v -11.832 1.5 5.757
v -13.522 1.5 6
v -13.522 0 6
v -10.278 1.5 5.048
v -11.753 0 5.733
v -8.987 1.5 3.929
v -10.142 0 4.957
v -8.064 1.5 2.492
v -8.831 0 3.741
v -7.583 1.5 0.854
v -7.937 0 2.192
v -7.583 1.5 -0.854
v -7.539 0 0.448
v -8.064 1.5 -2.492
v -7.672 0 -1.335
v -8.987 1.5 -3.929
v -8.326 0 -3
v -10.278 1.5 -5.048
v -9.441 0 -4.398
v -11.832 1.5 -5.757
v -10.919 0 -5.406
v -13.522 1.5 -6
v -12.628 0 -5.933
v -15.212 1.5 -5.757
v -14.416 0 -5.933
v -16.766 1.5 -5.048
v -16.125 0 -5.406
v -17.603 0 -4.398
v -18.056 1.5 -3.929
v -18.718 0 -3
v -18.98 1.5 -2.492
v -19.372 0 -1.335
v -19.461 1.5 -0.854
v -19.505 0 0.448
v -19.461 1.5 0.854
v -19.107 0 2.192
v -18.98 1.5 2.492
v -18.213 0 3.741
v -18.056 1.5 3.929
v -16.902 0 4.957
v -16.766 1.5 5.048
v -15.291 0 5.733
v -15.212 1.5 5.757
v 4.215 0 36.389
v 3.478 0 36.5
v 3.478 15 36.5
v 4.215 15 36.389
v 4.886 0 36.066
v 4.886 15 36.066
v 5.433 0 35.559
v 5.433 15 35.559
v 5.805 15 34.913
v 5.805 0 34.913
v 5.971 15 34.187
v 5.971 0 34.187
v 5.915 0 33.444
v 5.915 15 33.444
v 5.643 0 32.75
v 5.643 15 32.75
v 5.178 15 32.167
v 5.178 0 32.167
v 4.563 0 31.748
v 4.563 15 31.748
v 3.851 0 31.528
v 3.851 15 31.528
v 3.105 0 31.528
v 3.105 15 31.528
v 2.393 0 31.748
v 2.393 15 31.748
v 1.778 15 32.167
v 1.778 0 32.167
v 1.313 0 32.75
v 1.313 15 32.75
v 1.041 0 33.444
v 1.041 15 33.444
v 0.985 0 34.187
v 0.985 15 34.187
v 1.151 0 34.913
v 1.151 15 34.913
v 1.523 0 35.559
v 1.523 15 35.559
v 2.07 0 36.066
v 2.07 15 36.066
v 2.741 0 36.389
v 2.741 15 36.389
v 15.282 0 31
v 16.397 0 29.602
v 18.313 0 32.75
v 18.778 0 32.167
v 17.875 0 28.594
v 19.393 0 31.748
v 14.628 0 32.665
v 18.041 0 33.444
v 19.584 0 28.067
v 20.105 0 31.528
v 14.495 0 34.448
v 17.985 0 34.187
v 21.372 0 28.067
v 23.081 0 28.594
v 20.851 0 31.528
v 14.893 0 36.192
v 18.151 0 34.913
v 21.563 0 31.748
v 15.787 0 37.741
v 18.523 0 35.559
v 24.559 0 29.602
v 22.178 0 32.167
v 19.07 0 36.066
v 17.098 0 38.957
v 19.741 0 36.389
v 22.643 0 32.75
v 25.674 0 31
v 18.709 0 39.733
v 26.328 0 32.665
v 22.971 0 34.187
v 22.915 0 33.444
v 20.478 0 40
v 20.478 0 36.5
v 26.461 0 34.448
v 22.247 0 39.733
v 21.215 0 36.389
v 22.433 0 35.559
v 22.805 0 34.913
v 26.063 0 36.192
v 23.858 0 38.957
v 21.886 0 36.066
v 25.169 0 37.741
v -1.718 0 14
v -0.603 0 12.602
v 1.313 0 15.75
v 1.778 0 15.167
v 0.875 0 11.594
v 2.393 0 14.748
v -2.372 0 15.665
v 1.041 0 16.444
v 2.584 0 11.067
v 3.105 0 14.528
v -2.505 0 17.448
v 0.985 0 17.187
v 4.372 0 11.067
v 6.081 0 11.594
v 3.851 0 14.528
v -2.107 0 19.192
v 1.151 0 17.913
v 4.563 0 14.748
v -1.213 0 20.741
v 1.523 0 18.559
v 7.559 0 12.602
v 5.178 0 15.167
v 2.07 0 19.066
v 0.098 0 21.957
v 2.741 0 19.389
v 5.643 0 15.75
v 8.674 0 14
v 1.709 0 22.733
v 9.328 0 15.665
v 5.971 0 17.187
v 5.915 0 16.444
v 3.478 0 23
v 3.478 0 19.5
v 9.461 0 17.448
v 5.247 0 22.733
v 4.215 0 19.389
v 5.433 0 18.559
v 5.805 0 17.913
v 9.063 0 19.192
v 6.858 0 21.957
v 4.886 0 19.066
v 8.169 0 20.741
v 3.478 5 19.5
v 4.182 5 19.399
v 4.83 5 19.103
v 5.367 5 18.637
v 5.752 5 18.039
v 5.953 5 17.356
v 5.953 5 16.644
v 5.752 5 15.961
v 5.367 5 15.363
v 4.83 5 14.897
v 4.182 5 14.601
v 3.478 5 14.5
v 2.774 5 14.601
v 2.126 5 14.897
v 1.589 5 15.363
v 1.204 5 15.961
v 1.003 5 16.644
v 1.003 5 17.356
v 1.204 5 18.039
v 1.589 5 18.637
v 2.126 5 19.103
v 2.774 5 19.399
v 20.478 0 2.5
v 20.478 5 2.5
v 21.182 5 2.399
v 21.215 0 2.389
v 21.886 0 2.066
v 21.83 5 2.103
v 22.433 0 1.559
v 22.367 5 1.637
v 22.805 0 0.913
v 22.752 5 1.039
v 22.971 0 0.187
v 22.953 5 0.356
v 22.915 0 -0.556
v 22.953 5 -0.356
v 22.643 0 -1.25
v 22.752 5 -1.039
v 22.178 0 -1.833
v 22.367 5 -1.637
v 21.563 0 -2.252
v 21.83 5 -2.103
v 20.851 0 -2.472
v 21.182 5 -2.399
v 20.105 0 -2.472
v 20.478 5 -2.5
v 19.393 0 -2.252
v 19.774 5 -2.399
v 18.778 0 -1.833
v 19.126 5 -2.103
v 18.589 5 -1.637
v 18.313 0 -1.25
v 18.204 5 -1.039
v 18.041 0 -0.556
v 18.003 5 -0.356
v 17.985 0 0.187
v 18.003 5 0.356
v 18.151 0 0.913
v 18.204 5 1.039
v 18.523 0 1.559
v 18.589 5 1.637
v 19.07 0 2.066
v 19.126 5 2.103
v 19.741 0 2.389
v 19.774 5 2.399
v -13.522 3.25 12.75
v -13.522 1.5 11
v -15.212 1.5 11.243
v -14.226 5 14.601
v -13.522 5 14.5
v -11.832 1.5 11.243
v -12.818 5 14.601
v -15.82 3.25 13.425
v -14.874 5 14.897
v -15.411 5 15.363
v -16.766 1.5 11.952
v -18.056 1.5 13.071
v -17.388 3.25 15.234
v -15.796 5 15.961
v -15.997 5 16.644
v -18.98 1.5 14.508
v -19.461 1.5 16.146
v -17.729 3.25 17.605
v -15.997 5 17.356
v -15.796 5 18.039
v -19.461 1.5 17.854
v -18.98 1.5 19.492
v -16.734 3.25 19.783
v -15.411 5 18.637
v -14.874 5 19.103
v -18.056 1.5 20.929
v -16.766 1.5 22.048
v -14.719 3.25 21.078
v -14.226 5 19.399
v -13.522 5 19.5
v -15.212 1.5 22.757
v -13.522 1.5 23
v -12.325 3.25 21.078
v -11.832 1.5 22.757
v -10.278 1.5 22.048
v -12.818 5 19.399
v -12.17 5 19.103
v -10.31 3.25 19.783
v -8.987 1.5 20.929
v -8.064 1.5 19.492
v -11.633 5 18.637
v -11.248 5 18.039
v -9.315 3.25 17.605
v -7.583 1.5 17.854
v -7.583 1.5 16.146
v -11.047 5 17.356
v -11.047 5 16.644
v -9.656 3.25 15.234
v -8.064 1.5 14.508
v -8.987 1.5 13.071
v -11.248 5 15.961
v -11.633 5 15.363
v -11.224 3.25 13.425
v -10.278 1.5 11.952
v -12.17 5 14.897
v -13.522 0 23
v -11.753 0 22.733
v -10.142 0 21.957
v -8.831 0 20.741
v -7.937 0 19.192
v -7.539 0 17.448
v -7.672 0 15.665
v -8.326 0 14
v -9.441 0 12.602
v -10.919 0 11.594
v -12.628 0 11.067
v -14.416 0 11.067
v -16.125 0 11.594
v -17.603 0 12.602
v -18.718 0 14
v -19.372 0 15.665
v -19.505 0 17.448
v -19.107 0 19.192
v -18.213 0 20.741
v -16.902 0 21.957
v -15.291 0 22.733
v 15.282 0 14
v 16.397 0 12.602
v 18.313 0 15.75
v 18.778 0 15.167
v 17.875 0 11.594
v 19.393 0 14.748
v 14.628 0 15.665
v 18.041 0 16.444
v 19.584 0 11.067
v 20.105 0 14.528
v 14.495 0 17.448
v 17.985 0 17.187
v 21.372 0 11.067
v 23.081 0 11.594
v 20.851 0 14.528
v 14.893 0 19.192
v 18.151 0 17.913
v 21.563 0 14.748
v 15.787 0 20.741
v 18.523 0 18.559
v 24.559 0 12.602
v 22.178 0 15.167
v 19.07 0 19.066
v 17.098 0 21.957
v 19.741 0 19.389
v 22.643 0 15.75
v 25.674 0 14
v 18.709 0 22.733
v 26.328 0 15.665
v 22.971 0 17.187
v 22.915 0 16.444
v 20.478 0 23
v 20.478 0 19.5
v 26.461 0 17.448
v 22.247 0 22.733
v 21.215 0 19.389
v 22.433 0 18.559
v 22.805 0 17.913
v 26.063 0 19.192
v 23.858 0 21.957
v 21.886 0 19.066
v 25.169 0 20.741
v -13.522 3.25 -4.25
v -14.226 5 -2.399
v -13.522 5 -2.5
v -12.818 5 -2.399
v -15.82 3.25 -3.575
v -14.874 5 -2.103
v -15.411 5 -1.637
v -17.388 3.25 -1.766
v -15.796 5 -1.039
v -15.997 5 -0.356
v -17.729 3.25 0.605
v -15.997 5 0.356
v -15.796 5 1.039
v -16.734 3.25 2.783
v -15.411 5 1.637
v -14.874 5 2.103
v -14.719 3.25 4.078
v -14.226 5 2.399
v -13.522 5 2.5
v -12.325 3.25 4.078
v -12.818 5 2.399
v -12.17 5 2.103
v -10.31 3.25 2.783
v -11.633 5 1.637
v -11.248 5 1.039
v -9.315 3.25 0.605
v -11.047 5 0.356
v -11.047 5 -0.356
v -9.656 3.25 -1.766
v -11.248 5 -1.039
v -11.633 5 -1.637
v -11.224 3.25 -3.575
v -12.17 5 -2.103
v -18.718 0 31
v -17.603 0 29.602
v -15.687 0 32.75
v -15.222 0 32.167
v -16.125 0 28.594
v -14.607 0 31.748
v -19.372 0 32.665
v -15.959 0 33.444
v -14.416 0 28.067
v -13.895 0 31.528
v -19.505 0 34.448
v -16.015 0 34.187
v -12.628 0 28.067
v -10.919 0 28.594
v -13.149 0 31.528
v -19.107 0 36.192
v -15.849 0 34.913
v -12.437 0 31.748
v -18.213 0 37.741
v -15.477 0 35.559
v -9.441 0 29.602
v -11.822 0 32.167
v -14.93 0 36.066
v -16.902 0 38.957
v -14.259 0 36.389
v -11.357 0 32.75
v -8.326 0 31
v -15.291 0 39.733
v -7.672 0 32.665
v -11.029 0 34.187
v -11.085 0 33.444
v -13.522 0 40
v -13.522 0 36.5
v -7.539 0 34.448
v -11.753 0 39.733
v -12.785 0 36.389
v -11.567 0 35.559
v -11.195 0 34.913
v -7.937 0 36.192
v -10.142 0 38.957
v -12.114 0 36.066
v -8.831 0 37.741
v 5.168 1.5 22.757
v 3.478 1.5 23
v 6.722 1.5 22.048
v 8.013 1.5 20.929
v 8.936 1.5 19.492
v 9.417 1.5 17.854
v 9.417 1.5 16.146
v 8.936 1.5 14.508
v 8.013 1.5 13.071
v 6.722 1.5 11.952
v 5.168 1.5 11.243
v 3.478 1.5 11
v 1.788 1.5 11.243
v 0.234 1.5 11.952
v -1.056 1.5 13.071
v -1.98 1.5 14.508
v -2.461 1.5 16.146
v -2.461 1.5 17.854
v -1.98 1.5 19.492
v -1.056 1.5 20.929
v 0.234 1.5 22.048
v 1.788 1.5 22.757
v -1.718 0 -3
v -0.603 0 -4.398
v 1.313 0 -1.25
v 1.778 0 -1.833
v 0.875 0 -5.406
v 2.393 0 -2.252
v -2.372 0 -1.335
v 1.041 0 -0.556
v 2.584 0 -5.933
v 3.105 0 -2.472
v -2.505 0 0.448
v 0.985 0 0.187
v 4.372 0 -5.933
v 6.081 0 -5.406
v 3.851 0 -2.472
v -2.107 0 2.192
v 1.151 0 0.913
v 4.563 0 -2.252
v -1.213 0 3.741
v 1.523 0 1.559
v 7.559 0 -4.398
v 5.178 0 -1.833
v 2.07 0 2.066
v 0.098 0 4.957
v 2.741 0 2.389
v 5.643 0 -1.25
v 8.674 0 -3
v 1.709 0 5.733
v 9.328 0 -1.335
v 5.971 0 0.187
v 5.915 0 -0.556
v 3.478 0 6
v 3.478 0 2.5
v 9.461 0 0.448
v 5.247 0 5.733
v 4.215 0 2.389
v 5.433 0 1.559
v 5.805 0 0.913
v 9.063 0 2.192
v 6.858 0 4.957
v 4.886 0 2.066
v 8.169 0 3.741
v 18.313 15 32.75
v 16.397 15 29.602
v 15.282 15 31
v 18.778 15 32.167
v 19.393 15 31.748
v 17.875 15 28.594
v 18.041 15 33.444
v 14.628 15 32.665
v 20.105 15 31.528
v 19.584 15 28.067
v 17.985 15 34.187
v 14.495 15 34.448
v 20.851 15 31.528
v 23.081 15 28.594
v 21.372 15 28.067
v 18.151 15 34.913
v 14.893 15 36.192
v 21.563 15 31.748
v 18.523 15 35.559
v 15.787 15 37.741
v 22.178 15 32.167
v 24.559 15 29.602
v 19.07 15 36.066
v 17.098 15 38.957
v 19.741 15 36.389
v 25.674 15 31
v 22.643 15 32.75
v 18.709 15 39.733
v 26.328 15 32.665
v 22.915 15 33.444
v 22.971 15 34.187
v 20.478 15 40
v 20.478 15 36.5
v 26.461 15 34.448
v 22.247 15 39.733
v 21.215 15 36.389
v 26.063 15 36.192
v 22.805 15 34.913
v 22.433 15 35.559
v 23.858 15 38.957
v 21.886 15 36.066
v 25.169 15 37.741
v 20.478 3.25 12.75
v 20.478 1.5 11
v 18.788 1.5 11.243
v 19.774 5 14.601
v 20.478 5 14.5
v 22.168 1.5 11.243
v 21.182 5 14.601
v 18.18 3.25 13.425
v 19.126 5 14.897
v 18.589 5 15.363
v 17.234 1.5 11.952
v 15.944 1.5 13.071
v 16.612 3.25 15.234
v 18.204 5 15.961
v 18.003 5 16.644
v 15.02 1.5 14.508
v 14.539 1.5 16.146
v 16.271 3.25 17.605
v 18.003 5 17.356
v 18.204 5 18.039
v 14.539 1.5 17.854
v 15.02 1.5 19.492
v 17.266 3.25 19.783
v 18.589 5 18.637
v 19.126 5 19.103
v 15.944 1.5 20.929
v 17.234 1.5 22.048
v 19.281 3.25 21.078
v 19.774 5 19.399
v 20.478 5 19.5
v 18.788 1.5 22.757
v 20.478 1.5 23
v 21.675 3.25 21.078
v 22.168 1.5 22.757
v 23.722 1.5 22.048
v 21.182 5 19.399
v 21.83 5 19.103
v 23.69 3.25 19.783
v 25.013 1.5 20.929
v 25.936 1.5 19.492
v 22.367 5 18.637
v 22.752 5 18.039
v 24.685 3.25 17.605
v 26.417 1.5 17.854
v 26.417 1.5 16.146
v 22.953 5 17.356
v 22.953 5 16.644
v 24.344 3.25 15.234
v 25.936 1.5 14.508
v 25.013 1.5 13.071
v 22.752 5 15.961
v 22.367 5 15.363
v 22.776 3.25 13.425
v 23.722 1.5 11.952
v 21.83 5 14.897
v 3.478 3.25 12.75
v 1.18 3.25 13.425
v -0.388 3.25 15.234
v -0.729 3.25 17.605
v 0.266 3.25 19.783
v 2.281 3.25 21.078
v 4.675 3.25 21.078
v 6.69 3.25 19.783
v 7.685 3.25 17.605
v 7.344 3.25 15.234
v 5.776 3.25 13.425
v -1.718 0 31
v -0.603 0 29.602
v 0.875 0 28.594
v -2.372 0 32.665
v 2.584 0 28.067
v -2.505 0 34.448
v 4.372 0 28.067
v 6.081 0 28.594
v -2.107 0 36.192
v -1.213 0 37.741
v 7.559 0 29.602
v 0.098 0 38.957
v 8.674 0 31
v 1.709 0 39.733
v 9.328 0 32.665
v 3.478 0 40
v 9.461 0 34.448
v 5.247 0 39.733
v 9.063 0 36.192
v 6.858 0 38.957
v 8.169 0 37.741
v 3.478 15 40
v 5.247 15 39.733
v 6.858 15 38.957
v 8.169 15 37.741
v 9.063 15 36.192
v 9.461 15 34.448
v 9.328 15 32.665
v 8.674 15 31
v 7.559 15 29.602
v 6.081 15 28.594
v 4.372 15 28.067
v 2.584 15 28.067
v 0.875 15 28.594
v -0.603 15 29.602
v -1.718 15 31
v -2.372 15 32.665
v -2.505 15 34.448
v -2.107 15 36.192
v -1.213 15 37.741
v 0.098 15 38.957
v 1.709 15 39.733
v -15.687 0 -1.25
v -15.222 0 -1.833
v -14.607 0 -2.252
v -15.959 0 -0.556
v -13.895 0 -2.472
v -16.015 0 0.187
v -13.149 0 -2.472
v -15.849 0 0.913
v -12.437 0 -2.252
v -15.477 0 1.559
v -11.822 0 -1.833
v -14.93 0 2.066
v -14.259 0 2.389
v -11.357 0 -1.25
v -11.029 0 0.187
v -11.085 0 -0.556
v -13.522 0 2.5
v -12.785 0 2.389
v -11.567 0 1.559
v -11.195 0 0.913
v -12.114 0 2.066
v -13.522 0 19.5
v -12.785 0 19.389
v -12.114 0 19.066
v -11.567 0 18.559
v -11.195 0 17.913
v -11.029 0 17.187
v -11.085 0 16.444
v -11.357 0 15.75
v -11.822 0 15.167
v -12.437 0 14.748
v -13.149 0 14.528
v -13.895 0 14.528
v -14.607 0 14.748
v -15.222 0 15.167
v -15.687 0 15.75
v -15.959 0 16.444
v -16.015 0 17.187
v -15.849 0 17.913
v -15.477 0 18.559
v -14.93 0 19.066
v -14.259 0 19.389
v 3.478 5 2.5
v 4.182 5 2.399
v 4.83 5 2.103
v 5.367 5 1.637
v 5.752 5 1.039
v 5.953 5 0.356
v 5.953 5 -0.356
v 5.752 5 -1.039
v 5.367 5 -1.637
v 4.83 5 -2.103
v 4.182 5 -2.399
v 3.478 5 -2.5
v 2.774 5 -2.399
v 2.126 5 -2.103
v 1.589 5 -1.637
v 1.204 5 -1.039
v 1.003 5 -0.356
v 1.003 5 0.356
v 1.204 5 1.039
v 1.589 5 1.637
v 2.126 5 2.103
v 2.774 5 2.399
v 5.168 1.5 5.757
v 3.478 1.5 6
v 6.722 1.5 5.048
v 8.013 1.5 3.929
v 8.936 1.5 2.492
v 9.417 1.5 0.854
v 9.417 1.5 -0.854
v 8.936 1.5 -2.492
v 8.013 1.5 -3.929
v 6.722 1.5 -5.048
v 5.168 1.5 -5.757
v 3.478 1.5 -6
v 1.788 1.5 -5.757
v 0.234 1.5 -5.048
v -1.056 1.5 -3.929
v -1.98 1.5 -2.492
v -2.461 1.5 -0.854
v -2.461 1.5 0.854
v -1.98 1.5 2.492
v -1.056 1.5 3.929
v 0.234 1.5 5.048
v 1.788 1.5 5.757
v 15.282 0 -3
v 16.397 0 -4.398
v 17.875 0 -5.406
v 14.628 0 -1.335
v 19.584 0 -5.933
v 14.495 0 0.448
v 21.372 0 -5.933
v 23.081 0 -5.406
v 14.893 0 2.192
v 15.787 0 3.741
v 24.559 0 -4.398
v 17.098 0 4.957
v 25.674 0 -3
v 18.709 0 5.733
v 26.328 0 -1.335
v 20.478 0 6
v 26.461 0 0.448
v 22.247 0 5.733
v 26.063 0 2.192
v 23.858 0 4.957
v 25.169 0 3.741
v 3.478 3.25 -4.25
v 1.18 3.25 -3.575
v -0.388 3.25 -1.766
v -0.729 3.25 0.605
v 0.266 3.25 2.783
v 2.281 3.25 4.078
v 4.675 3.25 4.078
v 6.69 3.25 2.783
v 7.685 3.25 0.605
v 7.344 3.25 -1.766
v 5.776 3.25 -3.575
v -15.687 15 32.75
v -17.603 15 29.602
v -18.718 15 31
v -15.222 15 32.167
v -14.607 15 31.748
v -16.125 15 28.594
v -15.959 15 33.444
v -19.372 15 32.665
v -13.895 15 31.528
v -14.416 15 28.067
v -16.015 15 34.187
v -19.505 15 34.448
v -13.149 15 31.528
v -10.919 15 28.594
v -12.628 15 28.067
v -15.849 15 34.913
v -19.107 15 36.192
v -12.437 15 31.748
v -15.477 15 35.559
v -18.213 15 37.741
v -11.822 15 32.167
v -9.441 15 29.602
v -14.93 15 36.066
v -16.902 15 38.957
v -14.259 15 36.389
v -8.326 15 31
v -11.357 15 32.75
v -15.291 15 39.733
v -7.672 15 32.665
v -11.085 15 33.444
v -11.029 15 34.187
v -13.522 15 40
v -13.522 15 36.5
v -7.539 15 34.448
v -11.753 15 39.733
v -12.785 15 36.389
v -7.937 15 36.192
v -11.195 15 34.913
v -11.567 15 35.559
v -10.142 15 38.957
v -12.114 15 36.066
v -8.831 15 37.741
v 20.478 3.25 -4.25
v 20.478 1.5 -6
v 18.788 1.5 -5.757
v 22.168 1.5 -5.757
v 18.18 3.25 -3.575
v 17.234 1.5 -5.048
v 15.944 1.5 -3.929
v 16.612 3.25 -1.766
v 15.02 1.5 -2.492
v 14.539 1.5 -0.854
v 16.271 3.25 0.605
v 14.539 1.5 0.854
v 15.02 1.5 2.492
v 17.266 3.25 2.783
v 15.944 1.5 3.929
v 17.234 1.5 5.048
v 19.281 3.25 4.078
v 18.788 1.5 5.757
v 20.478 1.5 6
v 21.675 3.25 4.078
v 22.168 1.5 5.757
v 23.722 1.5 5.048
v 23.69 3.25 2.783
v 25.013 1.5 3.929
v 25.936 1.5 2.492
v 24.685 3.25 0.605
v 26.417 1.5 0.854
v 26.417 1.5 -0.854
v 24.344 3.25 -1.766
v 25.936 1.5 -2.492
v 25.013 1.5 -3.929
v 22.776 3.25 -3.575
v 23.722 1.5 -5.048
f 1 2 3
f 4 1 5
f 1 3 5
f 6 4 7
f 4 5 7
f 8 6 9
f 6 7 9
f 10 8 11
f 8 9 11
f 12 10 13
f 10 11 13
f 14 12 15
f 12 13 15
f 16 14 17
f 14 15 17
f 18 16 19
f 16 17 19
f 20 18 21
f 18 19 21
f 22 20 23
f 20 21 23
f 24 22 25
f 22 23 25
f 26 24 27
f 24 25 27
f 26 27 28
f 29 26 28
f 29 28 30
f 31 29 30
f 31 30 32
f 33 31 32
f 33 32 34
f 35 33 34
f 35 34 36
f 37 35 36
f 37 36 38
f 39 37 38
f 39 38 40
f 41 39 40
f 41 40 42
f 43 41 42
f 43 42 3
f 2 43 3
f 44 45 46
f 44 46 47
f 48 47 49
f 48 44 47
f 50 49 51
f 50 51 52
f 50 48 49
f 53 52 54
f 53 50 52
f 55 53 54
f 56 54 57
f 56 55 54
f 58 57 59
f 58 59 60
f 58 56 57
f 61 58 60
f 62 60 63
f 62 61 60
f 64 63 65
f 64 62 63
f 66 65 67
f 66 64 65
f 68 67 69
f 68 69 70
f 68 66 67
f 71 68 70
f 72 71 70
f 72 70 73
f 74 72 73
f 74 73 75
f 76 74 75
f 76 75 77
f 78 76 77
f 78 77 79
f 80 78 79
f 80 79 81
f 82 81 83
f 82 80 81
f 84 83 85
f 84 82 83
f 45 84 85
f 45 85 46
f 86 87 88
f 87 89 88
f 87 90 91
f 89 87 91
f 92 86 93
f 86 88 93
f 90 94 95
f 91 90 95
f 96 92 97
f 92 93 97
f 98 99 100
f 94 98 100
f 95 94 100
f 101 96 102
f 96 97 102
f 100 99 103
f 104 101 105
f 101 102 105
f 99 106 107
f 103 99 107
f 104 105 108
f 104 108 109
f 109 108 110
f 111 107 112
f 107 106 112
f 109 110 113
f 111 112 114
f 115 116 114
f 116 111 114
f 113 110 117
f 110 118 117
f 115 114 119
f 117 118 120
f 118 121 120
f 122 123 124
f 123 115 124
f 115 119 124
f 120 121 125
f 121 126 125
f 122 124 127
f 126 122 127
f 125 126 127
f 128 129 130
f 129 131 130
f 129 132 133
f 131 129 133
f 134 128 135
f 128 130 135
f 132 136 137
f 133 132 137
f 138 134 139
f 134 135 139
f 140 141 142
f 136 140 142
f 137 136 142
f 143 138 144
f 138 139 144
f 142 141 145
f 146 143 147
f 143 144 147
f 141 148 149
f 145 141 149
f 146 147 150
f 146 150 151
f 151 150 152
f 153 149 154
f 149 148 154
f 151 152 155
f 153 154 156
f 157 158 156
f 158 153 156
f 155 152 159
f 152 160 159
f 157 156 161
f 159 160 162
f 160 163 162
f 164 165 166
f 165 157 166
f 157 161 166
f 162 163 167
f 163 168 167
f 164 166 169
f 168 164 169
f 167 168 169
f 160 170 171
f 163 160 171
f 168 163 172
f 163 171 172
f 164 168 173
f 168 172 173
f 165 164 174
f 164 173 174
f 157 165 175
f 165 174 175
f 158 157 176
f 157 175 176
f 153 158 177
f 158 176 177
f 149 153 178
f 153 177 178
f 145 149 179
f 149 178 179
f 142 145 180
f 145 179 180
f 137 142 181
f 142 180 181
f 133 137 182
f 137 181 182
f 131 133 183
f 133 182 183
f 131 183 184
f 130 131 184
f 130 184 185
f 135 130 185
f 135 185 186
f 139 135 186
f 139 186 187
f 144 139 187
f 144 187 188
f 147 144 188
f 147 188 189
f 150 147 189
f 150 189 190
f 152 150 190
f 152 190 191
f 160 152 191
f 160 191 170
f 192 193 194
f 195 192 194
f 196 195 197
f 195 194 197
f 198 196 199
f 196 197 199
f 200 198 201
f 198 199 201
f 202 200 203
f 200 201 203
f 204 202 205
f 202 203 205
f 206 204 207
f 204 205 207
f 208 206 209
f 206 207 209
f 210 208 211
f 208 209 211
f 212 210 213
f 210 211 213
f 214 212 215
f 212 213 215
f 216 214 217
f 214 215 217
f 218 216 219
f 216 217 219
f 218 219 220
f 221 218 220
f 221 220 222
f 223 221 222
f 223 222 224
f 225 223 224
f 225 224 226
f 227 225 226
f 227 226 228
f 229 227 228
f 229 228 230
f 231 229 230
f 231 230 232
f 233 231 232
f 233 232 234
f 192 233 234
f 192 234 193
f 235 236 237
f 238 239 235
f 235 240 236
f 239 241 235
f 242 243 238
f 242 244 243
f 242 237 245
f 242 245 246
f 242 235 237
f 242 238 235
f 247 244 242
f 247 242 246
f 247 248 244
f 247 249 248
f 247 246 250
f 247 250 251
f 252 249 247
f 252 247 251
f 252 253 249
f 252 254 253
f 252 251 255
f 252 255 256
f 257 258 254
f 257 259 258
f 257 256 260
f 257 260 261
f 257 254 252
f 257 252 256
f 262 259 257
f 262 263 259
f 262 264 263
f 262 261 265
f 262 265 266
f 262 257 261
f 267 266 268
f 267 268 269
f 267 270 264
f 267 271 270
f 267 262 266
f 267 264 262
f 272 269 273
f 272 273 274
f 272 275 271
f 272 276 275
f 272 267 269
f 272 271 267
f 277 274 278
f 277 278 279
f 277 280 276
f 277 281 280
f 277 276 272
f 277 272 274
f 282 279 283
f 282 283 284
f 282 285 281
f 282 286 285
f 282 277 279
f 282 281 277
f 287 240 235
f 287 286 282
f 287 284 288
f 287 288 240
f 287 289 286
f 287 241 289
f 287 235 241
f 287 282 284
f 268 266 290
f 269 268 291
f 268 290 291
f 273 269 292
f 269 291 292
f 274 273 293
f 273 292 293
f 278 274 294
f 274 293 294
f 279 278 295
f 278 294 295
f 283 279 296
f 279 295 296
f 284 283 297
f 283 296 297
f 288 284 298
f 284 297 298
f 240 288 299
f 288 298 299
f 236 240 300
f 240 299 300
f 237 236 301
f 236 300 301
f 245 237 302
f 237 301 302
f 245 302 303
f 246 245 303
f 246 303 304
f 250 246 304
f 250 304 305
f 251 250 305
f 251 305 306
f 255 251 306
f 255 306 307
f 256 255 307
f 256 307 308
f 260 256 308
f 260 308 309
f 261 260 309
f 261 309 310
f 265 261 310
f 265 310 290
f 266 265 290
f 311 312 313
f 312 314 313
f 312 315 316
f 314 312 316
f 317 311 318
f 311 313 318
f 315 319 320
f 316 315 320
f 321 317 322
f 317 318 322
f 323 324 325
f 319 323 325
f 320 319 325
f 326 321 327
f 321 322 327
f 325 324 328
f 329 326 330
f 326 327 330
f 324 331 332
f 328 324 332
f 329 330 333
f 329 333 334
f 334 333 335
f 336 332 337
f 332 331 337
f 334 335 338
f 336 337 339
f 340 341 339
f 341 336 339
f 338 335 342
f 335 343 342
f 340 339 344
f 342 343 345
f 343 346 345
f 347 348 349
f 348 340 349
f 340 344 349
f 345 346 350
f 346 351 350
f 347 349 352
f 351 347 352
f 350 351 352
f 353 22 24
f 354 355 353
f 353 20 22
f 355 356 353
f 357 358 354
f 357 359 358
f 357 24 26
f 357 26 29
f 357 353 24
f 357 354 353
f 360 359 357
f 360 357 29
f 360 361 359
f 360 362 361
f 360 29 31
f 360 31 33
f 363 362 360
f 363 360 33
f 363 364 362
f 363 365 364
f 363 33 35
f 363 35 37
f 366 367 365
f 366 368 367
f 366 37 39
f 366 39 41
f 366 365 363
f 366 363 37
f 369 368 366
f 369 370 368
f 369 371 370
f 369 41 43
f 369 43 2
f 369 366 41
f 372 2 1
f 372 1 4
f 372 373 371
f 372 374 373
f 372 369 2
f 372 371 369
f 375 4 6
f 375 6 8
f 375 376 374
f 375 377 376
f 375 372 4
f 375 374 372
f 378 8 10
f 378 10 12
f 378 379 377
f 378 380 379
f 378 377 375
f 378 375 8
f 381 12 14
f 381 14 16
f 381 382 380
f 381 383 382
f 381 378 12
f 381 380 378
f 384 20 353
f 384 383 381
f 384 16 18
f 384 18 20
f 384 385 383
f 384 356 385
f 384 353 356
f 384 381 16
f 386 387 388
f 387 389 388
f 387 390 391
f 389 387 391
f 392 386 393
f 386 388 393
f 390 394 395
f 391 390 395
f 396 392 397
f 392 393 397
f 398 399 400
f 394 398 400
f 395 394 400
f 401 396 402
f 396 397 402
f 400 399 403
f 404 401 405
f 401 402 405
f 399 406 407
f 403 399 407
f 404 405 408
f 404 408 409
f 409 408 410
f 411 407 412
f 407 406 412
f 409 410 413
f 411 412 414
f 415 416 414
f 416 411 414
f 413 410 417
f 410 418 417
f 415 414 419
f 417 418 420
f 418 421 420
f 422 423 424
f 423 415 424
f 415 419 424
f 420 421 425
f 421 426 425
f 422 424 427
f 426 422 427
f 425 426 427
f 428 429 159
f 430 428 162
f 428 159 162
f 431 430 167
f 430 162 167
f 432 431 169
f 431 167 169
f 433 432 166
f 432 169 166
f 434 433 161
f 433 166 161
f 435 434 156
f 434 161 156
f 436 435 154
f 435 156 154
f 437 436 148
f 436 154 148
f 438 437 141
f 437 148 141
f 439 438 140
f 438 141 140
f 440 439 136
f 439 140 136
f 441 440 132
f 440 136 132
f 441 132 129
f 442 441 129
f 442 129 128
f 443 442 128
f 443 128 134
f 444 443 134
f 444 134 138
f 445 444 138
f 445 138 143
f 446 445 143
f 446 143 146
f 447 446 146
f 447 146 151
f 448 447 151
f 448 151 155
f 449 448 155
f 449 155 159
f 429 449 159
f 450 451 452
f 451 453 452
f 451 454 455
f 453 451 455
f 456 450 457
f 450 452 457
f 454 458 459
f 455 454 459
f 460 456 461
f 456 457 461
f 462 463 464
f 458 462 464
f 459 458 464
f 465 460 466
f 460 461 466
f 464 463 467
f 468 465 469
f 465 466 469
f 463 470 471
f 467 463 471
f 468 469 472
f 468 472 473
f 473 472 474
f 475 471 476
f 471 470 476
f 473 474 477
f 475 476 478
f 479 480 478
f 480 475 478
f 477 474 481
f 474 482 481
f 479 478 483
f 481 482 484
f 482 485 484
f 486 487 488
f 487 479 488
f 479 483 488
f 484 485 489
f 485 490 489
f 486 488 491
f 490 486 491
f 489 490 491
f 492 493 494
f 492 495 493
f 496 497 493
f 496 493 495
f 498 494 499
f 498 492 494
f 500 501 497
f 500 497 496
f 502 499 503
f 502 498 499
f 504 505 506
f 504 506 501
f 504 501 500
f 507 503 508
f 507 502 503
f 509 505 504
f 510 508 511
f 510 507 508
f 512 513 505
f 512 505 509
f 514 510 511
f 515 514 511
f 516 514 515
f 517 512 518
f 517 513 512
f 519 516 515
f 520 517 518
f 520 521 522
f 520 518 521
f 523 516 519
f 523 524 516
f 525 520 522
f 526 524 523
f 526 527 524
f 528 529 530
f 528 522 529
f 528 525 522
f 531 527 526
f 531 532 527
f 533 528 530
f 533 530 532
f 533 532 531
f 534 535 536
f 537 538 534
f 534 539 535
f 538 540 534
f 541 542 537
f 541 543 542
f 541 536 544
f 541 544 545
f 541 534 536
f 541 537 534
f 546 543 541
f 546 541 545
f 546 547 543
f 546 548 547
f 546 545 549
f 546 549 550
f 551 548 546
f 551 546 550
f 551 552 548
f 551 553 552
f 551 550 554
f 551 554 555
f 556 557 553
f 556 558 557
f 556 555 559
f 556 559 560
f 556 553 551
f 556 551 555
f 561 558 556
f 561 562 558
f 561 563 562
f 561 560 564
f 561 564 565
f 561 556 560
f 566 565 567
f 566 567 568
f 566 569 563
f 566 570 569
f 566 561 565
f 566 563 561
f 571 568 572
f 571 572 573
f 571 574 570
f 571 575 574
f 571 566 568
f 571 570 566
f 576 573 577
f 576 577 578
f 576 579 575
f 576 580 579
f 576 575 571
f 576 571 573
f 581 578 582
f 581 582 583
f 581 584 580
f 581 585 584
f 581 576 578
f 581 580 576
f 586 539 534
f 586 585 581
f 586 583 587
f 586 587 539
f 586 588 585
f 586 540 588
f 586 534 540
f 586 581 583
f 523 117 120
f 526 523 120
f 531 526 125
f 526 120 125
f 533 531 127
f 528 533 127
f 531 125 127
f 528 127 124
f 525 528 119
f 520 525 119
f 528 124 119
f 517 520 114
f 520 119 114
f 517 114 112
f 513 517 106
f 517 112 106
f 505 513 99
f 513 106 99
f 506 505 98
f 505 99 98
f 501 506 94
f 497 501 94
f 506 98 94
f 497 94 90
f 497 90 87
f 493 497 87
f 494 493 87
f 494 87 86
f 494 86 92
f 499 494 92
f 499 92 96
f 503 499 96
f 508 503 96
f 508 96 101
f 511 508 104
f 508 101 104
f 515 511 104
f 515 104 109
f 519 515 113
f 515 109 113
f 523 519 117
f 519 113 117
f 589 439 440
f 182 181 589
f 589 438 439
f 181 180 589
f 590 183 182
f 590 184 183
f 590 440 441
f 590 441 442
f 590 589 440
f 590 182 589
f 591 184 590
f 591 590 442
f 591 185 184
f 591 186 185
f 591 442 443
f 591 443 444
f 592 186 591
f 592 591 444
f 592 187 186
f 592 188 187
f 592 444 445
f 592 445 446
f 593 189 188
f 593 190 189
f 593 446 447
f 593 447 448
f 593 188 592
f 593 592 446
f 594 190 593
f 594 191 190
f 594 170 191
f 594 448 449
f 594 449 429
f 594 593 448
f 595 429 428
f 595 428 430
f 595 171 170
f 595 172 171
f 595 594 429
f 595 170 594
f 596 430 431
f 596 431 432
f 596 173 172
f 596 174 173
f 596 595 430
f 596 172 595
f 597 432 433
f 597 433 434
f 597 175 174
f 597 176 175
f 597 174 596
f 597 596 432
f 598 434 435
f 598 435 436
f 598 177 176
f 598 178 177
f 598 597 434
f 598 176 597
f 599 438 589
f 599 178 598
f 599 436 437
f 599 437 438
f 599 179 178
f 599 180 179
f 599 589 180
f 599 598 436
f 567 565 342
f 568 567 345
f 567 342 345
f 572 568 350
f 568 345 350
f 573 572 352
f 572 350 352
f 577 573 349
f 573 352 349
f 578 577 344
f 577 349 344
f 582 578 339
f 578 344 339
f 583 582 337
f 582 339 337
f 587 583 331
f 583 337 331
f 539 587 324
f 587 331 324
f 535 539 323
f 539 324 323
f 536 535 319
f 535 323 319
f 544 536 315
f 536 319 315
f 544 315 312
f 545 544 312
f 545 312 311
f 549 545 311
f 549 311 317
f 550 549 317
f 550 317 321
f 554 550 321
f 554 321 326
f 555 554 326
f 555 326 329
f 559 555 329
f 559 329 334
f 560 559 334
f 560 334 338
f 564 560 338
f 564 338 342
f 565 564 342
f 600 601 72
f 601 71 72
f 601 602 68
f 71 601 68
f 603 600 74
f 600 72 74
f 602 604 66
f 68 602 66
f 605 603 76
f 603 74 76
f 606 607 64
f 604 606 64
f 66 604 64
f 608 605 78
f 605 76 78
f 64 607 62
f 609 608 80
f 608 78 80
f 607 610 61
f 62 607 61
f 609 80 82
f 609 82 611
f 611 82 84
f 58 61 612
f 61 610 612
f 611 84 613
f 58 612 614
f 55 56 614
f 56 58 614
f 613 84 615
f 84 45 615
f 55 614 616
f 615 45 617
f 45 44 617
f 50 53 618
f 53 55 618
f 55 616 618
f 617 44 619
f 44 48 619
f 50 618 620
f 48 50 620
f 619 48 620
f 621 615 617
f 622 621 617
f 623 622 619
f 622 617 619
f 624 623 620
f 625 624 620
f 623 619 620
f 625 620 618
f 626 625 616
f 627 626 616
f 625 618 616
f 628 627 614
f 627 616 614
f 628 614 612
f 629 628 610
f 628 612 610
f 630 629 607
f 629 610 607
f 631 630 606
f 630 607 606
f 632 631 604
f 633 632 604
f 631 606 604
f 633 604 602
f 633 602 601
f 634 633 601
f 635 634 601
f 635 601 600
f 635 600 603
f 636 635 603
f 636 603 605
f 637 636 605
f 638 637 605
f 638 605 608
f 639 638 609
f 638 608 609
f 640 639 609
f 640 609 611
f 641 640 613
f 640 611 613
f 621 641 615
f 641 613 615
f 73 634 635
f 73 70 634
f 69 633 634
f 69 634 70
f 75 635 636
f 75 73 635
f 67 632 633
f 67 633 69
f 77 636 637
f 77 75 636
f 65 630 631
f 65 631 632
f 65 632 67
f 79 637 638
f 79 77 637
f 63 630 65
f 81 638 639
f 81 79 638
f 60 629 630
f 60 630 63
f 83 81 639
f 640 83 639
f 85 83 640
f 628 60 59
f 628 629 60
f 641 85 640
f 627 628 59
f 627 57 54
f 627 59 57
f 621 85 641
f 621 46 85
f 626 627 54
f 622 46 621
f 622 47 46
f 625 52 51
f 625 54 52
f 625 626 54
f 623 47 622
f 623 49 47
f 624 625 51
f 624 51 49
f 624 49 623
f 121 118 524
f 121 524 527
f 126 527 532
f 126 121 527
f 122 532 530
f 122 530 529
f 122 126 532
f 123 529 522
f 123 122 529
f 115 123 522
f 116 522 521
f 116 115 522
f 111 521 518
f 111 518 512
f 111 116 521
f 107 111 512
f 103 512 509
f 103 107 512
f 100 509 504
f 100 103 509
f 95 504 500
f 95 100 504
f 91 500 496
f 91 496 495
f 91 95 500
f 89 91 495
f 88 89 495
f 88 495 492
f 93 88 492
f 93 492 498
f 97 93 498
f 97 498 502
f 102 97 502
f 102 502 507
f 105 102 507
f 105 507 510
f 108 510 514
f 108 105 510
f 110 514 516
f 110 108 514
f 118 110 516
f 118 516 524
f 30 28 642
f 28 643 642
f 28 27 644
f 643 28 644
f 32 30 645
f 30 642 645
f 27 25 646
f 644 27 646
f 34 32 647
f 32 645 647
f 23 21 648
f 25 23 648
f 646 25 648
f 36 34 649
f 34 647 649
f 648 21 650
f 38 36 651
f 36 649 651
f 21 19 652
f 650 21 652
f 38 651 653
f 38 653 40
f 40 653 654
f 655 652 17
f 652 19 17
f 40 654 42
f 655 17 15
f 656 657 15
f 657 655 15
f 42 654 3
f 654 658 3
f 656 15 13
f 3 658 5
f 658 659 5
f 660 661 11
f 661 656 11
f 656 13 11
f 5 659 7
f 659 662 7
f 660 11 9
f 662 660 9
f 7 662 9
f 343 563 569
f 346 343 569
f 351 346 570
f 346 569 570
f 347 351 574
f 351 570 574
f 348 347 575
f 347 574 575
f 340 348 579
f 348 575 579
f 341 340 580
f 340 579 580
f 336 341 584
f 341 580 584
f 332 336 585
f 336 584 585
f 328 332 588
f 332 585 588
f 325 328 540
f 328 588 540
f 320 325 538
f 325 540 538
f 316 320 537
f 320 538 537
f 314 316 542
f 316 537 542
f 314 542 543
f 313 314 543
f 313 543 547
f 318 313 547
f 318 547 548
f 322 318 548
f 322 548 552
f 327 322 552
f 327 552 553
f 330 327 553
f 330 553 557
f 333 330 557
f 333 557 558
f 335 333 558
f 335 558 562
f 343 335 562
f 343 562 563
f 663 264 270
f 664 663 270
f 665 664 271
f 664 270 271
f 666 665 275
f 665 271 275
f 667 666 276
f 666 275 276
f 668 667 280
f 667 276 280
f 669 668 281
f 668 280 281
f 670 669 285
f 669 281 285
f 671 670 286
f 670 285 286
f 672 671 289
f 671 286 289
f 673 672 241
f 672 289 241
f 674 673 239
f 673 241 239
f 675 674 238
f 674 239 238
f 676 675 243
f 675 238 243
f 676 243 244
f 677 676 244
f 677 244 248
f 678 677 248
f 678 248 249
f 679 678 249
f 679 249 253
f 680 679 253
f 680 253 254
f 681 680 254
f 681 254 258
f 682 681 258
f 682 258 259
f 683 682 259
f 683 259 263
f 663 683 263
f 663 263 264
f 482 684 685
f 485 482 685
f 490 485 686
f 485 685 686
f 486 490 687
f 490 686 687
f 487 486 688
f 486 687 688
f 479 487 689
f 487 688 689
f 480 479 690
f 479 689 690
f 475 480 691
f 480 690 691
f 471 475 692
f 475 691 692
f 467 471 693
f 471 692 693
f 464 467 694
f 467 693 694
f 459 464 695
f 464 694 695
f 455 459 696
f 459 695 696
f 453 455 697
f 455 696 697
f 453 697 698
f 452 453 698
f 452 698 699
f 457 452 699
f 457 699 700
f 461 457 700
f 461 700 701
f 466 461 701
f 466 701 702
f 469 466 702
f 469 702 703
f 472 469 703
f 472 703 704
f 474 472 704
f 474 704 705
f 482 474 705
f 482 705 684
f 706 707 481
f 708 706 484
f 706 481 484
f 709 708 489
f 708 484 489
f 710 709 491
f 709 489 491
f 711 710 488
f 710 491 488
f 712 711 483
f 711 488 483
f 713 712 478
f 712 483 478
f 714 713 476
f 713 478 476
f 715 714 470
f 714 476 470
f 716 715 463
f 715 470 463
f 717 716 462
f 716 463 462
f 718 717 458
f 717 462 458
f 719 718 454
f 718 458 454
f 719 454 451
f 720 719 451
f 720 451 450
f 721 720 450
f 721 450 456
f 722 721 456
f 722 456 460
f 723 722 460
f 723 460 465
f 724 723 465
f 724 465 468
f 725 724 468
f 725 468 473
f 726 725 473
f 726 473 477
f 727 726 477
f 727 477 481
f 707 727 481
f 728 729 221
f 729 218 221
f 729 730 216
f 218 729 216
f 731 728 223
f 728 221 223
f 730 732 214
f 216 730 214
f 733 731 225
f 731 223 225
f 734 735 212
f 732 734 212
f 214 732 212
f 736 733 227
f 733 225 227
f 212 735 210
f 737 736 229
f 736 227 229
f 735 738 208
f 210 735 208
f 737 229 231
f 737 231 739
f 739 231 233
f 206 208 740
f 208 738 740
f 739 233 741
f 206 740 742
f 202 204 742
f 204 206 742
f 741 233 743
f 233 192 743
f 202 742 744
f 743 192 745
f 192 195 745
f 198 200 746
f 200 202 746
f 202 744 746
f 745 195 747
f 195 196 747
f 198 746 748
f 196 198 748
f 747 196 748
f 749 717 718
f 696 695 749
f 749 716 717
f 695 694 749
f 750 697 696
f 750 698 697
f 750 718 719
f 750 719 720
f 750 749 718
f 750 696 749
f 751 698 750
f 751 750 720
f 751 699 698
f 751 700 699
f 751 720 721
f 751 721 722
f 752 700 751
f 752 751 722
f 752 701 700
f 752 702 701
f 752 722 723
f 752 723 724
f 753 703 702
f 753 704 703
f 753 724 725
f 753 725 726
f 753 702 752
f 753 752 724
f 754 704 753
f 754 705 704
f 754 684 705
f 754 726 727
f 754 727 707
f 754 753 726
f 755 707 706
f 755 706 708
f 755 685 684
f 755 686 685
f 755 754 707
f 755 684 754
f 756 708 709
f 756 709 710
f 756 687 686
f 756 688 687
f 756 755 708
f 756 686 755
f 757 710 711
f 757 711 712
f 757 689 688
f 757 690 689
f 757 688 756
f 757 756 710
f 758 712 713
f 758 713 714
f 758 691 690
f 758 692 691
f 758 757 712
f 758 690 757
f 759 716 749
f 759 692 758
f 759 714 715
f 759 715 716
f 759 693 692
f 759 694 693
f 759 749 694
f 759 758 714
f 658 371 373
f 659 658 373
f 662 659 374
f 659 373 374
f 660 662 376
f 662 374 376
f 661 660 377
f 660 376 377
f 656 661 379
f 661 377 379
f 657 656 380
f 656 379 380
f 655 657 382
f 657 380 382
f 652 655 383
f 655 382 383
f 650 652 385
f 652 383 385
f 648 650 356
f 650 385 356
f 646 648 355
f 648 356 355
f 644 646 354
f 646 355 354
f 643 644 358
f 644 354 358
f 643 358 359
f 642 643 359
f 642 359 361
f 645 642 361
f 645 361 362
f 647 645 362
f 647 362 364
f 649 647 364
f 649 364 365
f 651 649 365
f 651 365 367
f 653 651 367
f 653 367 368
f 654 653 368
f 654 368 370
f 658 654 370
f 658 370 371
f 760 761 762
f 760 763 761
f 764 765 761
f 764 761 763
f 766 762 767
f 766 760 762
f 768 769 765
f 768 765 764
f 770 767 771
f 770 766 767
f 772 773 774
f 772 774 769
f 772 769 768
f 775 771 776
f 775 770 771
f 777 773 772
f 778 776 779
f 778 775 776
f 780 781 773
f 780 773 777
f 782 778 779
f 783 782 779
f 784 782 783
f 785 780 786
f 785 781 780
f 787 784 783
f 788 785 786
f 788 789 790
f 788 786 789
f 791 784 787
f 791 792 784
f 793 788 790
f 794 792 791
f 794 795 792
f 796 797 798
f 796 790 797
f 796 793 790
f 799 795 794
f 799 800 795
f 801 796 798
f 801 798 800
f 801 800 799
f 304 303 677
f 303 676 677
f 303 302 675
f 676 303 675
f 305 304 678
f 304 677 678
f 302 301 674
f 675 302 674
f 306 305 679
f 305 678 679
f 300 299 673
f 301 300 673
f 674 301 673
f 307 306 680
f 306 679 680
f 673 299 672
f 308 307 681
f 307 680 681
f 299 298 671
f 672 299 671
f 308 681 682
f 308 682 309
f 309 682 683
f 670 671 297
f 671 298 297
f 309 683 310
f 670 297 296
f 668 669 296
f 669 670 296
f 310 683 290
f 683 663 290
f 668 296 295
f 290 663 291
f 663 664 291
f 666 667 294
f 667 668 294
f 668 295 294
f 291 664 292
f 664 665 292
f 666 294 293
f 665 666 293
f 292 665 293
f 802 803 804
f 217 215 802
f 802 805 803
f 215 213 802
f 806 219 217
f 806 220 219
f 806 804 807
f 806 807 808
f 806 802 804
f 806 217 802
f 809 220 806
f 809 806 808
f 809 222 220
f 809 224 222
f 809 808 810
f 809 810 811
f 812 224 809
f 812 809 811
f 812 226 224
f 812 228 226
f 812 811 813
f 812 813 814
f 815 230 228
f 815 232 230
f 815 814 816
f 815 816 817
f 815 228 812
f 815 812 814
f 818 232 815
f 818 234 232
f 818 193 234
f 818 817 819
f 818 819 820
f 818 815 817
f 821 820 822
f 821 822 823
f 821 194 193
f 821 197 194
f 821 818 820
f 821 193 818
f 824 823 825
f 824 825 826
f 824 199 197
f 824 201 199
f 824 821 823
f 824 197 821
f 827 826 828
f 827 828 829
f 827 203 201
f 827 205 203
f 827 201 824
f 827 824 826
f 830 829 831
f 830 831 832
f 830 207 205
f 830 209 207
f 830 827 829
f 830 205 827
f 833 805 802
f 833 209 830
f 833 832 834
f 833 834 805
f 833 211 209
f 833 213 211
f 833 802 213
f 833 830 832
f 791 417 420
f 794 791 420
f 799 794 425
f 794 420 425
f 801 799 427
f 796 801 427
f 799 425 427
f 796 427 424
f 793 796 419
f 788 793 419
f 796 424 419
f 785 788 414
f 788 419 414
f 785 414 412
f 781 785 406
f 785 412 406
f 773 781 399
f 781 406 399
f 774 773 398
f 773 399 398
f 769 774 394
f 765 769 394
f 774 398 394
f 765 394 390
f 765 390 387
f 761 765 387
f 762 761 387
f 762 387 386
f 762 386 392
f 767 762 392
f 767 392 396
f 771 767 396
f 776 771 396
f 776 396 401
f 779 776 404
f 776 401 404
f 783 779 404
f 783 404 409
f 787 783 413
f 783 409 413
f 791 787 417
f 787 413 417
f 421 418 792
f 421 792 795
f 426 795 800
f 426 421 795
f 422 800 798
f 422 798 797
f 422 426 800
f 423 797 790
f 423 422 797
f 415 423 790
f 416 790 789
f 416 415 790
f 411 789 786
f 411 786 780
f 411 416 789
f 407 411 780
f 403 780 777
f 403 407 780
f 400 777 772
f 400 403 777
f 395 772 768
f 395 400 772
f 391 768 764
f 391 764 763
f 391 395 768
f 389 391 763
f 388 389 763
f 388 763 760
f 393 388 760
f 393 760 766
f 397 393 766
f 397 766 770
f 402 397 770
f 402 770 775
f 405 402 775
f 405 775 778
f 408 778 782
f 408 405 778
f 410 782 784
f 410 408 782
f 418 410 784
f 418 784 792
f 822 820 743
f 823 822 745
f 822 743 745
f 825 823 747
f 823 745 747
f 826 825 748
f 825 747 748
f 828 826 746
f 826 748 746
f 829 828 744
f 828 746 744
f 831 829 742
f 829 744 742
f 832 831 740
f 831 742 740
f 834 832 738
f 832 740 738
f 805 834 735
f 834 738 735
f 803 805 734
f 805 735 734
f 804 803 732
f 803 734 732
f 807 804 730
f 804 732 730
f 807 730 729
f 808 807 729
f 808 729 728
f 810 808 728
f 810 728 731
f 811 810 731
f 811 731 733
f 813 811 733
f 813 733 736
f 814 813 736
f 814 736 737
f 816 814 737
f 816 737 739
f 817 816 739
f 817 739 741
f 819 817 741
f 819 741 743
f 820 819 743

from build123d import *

# Parameters (mm, degrees)
CROQUIS5_R              = 6
SALIENTE_EXTRUIR3_DEPTH = 4
CROQUIS6_R              = 2.5
CORTAR_EXTRUIR3_DEPTH   = 4
SALIENTE_EXTRUIR4_START = 1
CROQUIS7_R              = 3.5
CROQUIS7_R_2            = 2.5
SALIENTE_EXTRUIR4_DEPTH = 1
MATRIZL1_COUNT          = 3
MATRIZL1_PITCH          = 17
MATRIZL1_2_COUNT        = 2
MATRIZL1_2_PITCH        = 17
CROQUIS11_R             = 6
CROQUIS11_R_2           = 2.5
SALIENTE_EXTRUIR5_DEPTH = 15
MATRIZL2_COUNT          = 3
MATRIZL2_PITCH          = 17


with BuildPart() as part:
    # Croquis5 → Saliente-Extruir3 (new body)
    with BuildSketch(Plane(origin=(0, 0, 0), x_dir=(1, 0, 0), z_dir=(0, 1, 0))):
        with Locations(Location((-13.521991575, 0, 0), (0, 0, 270))):
            Circle(CROQUIS5_R)
    extrude(amount=SALIENTE_EXTRUIR3_DEPTH)

    # Croquis6 → Cortar-Extruir3 (cut)
    with BuildSketch(Plane(origin=(0, 4, 0), x_dir=(1, 0, 0), z_dir=(0, 1, 0))):
        with Locations(Location((-13.521991575, 0, 0), (0, 0, 270))):
            Circle(CROQUIS6_R)
    extrude(amount=-CORTAR_EXTRUIR3_DEPTH, mode=Mode.SUBTRACT)

    # Croquis7 → Saliente-Extruir4 (add)
    with BuildSketch(Plane(origin=(0, 4, 0), x_dir=(1, 0, 0), z_dir=(0, 1, 0)).offset(SALIENTE_EXTRUIR4_START)):
        with Locations(Location((-13.521991575, 0, 0), (0, 0, 270))):
            Circle(CROQUIS7_R)
        with Locations(Location((-13.521991575, 0, 0), (0, 0, 270))):
            Circle(CROQUIS7_R_2, mode=Mode.SUBTRACT)
    extrude(amount=-SALIENTE_EXTRUIR4_DEPTH)

    # Croquis9 → Cortar-Revolución4 (revolve, cut)
    with BuildSketch(Plane.XY, mode=Mode.PRIVATE) as cortar_revoluci_n4_sk:
        Polygon((-19.521991575, 1.5), (-16.021991575, 5), (-19.521991575, 5), align=None)
    revolve(cortar_revoluci_n4_sk.sketch.rotate(Axis((-13.521991575, 0, 0), (0, 1, 0)), 270), axis=Axis((-13.521991575, 0, 0), (0, 1, 0)), mode=Mode.SUBTRACT)


with BuildPart() as matrizl1_1:
    # MatrizL1: pattern copy
    add(part.part.moved(Location(Vector(1, 0, 0) * (1 * MATRIZL1_PITCH))))


with BuildPart() as matrizl1_2:
    # MatrizL1: pattern copy
    add(part.part.moved(Location(Vector(1, 0, 0) * (2 * MATRIZL1_PITCH))))


with BuildPart() as matrizl1_2_1:
    # MatrizL1 2: pattern copy
    add(part.part.moved(Location(Vector(0, 0, 1) * (1 * MATRIZL1_2_PITCH))))


with BuildPart() as matrizl1_2_2:
    # MatrizL1 2: pattern copy
    add(matrizl1_1.part.moved(Location(Vector(0, 0, 1) * (1 * MATRIZL1_2_PITCH))))


with BuildPart() as matrizl1_2_3:
    # MatrizL1 2: pattern copy
    add(matrizl1_2.part.moved(Location(Vector(0, 0, 1) * (1 * MATRIZL1_2_PITCH))))


with BuildPart() as body_7:
    # Croquis11 → Saliente-Extruir5 (new body)
    with BuildSketch(Plane(origin=(0, 0, 0), x_dir=(1, 0, 0), z_dir=(0, 1, 0))):
        with Locations(Location((-13.521991575, -34, 0), (0, 0, 270))):
            Circle(CROQUIS11_R)
        with Locations(Location((-13.521991575, -34, 0), (0, 0, 270))):
            Circle(CROQUIS11_R_2, mode=Mode.SUBTRACT)
    saliente_extruir5 = extrude(amount=SALIENTE_EXTRUIR5_DEPTH)


with BuildPart() as matrizl2_1:
    # MatrizL2: Saliente-Extruir5 ×3
    with Locations(*[(i * MATRIZL2_PITCH, 0, 0) for i in range(1, MATRIZL2_COUNT)]):
        add(saliente_extruir5)


solid = Compound([part.part, matrizl1_1.part, matrizl1_2.part, matrizl1_2_1.part, matrizl1_2_2.part, matrizl1_2_3.part, body_7.part, matrizl2_1.part])
